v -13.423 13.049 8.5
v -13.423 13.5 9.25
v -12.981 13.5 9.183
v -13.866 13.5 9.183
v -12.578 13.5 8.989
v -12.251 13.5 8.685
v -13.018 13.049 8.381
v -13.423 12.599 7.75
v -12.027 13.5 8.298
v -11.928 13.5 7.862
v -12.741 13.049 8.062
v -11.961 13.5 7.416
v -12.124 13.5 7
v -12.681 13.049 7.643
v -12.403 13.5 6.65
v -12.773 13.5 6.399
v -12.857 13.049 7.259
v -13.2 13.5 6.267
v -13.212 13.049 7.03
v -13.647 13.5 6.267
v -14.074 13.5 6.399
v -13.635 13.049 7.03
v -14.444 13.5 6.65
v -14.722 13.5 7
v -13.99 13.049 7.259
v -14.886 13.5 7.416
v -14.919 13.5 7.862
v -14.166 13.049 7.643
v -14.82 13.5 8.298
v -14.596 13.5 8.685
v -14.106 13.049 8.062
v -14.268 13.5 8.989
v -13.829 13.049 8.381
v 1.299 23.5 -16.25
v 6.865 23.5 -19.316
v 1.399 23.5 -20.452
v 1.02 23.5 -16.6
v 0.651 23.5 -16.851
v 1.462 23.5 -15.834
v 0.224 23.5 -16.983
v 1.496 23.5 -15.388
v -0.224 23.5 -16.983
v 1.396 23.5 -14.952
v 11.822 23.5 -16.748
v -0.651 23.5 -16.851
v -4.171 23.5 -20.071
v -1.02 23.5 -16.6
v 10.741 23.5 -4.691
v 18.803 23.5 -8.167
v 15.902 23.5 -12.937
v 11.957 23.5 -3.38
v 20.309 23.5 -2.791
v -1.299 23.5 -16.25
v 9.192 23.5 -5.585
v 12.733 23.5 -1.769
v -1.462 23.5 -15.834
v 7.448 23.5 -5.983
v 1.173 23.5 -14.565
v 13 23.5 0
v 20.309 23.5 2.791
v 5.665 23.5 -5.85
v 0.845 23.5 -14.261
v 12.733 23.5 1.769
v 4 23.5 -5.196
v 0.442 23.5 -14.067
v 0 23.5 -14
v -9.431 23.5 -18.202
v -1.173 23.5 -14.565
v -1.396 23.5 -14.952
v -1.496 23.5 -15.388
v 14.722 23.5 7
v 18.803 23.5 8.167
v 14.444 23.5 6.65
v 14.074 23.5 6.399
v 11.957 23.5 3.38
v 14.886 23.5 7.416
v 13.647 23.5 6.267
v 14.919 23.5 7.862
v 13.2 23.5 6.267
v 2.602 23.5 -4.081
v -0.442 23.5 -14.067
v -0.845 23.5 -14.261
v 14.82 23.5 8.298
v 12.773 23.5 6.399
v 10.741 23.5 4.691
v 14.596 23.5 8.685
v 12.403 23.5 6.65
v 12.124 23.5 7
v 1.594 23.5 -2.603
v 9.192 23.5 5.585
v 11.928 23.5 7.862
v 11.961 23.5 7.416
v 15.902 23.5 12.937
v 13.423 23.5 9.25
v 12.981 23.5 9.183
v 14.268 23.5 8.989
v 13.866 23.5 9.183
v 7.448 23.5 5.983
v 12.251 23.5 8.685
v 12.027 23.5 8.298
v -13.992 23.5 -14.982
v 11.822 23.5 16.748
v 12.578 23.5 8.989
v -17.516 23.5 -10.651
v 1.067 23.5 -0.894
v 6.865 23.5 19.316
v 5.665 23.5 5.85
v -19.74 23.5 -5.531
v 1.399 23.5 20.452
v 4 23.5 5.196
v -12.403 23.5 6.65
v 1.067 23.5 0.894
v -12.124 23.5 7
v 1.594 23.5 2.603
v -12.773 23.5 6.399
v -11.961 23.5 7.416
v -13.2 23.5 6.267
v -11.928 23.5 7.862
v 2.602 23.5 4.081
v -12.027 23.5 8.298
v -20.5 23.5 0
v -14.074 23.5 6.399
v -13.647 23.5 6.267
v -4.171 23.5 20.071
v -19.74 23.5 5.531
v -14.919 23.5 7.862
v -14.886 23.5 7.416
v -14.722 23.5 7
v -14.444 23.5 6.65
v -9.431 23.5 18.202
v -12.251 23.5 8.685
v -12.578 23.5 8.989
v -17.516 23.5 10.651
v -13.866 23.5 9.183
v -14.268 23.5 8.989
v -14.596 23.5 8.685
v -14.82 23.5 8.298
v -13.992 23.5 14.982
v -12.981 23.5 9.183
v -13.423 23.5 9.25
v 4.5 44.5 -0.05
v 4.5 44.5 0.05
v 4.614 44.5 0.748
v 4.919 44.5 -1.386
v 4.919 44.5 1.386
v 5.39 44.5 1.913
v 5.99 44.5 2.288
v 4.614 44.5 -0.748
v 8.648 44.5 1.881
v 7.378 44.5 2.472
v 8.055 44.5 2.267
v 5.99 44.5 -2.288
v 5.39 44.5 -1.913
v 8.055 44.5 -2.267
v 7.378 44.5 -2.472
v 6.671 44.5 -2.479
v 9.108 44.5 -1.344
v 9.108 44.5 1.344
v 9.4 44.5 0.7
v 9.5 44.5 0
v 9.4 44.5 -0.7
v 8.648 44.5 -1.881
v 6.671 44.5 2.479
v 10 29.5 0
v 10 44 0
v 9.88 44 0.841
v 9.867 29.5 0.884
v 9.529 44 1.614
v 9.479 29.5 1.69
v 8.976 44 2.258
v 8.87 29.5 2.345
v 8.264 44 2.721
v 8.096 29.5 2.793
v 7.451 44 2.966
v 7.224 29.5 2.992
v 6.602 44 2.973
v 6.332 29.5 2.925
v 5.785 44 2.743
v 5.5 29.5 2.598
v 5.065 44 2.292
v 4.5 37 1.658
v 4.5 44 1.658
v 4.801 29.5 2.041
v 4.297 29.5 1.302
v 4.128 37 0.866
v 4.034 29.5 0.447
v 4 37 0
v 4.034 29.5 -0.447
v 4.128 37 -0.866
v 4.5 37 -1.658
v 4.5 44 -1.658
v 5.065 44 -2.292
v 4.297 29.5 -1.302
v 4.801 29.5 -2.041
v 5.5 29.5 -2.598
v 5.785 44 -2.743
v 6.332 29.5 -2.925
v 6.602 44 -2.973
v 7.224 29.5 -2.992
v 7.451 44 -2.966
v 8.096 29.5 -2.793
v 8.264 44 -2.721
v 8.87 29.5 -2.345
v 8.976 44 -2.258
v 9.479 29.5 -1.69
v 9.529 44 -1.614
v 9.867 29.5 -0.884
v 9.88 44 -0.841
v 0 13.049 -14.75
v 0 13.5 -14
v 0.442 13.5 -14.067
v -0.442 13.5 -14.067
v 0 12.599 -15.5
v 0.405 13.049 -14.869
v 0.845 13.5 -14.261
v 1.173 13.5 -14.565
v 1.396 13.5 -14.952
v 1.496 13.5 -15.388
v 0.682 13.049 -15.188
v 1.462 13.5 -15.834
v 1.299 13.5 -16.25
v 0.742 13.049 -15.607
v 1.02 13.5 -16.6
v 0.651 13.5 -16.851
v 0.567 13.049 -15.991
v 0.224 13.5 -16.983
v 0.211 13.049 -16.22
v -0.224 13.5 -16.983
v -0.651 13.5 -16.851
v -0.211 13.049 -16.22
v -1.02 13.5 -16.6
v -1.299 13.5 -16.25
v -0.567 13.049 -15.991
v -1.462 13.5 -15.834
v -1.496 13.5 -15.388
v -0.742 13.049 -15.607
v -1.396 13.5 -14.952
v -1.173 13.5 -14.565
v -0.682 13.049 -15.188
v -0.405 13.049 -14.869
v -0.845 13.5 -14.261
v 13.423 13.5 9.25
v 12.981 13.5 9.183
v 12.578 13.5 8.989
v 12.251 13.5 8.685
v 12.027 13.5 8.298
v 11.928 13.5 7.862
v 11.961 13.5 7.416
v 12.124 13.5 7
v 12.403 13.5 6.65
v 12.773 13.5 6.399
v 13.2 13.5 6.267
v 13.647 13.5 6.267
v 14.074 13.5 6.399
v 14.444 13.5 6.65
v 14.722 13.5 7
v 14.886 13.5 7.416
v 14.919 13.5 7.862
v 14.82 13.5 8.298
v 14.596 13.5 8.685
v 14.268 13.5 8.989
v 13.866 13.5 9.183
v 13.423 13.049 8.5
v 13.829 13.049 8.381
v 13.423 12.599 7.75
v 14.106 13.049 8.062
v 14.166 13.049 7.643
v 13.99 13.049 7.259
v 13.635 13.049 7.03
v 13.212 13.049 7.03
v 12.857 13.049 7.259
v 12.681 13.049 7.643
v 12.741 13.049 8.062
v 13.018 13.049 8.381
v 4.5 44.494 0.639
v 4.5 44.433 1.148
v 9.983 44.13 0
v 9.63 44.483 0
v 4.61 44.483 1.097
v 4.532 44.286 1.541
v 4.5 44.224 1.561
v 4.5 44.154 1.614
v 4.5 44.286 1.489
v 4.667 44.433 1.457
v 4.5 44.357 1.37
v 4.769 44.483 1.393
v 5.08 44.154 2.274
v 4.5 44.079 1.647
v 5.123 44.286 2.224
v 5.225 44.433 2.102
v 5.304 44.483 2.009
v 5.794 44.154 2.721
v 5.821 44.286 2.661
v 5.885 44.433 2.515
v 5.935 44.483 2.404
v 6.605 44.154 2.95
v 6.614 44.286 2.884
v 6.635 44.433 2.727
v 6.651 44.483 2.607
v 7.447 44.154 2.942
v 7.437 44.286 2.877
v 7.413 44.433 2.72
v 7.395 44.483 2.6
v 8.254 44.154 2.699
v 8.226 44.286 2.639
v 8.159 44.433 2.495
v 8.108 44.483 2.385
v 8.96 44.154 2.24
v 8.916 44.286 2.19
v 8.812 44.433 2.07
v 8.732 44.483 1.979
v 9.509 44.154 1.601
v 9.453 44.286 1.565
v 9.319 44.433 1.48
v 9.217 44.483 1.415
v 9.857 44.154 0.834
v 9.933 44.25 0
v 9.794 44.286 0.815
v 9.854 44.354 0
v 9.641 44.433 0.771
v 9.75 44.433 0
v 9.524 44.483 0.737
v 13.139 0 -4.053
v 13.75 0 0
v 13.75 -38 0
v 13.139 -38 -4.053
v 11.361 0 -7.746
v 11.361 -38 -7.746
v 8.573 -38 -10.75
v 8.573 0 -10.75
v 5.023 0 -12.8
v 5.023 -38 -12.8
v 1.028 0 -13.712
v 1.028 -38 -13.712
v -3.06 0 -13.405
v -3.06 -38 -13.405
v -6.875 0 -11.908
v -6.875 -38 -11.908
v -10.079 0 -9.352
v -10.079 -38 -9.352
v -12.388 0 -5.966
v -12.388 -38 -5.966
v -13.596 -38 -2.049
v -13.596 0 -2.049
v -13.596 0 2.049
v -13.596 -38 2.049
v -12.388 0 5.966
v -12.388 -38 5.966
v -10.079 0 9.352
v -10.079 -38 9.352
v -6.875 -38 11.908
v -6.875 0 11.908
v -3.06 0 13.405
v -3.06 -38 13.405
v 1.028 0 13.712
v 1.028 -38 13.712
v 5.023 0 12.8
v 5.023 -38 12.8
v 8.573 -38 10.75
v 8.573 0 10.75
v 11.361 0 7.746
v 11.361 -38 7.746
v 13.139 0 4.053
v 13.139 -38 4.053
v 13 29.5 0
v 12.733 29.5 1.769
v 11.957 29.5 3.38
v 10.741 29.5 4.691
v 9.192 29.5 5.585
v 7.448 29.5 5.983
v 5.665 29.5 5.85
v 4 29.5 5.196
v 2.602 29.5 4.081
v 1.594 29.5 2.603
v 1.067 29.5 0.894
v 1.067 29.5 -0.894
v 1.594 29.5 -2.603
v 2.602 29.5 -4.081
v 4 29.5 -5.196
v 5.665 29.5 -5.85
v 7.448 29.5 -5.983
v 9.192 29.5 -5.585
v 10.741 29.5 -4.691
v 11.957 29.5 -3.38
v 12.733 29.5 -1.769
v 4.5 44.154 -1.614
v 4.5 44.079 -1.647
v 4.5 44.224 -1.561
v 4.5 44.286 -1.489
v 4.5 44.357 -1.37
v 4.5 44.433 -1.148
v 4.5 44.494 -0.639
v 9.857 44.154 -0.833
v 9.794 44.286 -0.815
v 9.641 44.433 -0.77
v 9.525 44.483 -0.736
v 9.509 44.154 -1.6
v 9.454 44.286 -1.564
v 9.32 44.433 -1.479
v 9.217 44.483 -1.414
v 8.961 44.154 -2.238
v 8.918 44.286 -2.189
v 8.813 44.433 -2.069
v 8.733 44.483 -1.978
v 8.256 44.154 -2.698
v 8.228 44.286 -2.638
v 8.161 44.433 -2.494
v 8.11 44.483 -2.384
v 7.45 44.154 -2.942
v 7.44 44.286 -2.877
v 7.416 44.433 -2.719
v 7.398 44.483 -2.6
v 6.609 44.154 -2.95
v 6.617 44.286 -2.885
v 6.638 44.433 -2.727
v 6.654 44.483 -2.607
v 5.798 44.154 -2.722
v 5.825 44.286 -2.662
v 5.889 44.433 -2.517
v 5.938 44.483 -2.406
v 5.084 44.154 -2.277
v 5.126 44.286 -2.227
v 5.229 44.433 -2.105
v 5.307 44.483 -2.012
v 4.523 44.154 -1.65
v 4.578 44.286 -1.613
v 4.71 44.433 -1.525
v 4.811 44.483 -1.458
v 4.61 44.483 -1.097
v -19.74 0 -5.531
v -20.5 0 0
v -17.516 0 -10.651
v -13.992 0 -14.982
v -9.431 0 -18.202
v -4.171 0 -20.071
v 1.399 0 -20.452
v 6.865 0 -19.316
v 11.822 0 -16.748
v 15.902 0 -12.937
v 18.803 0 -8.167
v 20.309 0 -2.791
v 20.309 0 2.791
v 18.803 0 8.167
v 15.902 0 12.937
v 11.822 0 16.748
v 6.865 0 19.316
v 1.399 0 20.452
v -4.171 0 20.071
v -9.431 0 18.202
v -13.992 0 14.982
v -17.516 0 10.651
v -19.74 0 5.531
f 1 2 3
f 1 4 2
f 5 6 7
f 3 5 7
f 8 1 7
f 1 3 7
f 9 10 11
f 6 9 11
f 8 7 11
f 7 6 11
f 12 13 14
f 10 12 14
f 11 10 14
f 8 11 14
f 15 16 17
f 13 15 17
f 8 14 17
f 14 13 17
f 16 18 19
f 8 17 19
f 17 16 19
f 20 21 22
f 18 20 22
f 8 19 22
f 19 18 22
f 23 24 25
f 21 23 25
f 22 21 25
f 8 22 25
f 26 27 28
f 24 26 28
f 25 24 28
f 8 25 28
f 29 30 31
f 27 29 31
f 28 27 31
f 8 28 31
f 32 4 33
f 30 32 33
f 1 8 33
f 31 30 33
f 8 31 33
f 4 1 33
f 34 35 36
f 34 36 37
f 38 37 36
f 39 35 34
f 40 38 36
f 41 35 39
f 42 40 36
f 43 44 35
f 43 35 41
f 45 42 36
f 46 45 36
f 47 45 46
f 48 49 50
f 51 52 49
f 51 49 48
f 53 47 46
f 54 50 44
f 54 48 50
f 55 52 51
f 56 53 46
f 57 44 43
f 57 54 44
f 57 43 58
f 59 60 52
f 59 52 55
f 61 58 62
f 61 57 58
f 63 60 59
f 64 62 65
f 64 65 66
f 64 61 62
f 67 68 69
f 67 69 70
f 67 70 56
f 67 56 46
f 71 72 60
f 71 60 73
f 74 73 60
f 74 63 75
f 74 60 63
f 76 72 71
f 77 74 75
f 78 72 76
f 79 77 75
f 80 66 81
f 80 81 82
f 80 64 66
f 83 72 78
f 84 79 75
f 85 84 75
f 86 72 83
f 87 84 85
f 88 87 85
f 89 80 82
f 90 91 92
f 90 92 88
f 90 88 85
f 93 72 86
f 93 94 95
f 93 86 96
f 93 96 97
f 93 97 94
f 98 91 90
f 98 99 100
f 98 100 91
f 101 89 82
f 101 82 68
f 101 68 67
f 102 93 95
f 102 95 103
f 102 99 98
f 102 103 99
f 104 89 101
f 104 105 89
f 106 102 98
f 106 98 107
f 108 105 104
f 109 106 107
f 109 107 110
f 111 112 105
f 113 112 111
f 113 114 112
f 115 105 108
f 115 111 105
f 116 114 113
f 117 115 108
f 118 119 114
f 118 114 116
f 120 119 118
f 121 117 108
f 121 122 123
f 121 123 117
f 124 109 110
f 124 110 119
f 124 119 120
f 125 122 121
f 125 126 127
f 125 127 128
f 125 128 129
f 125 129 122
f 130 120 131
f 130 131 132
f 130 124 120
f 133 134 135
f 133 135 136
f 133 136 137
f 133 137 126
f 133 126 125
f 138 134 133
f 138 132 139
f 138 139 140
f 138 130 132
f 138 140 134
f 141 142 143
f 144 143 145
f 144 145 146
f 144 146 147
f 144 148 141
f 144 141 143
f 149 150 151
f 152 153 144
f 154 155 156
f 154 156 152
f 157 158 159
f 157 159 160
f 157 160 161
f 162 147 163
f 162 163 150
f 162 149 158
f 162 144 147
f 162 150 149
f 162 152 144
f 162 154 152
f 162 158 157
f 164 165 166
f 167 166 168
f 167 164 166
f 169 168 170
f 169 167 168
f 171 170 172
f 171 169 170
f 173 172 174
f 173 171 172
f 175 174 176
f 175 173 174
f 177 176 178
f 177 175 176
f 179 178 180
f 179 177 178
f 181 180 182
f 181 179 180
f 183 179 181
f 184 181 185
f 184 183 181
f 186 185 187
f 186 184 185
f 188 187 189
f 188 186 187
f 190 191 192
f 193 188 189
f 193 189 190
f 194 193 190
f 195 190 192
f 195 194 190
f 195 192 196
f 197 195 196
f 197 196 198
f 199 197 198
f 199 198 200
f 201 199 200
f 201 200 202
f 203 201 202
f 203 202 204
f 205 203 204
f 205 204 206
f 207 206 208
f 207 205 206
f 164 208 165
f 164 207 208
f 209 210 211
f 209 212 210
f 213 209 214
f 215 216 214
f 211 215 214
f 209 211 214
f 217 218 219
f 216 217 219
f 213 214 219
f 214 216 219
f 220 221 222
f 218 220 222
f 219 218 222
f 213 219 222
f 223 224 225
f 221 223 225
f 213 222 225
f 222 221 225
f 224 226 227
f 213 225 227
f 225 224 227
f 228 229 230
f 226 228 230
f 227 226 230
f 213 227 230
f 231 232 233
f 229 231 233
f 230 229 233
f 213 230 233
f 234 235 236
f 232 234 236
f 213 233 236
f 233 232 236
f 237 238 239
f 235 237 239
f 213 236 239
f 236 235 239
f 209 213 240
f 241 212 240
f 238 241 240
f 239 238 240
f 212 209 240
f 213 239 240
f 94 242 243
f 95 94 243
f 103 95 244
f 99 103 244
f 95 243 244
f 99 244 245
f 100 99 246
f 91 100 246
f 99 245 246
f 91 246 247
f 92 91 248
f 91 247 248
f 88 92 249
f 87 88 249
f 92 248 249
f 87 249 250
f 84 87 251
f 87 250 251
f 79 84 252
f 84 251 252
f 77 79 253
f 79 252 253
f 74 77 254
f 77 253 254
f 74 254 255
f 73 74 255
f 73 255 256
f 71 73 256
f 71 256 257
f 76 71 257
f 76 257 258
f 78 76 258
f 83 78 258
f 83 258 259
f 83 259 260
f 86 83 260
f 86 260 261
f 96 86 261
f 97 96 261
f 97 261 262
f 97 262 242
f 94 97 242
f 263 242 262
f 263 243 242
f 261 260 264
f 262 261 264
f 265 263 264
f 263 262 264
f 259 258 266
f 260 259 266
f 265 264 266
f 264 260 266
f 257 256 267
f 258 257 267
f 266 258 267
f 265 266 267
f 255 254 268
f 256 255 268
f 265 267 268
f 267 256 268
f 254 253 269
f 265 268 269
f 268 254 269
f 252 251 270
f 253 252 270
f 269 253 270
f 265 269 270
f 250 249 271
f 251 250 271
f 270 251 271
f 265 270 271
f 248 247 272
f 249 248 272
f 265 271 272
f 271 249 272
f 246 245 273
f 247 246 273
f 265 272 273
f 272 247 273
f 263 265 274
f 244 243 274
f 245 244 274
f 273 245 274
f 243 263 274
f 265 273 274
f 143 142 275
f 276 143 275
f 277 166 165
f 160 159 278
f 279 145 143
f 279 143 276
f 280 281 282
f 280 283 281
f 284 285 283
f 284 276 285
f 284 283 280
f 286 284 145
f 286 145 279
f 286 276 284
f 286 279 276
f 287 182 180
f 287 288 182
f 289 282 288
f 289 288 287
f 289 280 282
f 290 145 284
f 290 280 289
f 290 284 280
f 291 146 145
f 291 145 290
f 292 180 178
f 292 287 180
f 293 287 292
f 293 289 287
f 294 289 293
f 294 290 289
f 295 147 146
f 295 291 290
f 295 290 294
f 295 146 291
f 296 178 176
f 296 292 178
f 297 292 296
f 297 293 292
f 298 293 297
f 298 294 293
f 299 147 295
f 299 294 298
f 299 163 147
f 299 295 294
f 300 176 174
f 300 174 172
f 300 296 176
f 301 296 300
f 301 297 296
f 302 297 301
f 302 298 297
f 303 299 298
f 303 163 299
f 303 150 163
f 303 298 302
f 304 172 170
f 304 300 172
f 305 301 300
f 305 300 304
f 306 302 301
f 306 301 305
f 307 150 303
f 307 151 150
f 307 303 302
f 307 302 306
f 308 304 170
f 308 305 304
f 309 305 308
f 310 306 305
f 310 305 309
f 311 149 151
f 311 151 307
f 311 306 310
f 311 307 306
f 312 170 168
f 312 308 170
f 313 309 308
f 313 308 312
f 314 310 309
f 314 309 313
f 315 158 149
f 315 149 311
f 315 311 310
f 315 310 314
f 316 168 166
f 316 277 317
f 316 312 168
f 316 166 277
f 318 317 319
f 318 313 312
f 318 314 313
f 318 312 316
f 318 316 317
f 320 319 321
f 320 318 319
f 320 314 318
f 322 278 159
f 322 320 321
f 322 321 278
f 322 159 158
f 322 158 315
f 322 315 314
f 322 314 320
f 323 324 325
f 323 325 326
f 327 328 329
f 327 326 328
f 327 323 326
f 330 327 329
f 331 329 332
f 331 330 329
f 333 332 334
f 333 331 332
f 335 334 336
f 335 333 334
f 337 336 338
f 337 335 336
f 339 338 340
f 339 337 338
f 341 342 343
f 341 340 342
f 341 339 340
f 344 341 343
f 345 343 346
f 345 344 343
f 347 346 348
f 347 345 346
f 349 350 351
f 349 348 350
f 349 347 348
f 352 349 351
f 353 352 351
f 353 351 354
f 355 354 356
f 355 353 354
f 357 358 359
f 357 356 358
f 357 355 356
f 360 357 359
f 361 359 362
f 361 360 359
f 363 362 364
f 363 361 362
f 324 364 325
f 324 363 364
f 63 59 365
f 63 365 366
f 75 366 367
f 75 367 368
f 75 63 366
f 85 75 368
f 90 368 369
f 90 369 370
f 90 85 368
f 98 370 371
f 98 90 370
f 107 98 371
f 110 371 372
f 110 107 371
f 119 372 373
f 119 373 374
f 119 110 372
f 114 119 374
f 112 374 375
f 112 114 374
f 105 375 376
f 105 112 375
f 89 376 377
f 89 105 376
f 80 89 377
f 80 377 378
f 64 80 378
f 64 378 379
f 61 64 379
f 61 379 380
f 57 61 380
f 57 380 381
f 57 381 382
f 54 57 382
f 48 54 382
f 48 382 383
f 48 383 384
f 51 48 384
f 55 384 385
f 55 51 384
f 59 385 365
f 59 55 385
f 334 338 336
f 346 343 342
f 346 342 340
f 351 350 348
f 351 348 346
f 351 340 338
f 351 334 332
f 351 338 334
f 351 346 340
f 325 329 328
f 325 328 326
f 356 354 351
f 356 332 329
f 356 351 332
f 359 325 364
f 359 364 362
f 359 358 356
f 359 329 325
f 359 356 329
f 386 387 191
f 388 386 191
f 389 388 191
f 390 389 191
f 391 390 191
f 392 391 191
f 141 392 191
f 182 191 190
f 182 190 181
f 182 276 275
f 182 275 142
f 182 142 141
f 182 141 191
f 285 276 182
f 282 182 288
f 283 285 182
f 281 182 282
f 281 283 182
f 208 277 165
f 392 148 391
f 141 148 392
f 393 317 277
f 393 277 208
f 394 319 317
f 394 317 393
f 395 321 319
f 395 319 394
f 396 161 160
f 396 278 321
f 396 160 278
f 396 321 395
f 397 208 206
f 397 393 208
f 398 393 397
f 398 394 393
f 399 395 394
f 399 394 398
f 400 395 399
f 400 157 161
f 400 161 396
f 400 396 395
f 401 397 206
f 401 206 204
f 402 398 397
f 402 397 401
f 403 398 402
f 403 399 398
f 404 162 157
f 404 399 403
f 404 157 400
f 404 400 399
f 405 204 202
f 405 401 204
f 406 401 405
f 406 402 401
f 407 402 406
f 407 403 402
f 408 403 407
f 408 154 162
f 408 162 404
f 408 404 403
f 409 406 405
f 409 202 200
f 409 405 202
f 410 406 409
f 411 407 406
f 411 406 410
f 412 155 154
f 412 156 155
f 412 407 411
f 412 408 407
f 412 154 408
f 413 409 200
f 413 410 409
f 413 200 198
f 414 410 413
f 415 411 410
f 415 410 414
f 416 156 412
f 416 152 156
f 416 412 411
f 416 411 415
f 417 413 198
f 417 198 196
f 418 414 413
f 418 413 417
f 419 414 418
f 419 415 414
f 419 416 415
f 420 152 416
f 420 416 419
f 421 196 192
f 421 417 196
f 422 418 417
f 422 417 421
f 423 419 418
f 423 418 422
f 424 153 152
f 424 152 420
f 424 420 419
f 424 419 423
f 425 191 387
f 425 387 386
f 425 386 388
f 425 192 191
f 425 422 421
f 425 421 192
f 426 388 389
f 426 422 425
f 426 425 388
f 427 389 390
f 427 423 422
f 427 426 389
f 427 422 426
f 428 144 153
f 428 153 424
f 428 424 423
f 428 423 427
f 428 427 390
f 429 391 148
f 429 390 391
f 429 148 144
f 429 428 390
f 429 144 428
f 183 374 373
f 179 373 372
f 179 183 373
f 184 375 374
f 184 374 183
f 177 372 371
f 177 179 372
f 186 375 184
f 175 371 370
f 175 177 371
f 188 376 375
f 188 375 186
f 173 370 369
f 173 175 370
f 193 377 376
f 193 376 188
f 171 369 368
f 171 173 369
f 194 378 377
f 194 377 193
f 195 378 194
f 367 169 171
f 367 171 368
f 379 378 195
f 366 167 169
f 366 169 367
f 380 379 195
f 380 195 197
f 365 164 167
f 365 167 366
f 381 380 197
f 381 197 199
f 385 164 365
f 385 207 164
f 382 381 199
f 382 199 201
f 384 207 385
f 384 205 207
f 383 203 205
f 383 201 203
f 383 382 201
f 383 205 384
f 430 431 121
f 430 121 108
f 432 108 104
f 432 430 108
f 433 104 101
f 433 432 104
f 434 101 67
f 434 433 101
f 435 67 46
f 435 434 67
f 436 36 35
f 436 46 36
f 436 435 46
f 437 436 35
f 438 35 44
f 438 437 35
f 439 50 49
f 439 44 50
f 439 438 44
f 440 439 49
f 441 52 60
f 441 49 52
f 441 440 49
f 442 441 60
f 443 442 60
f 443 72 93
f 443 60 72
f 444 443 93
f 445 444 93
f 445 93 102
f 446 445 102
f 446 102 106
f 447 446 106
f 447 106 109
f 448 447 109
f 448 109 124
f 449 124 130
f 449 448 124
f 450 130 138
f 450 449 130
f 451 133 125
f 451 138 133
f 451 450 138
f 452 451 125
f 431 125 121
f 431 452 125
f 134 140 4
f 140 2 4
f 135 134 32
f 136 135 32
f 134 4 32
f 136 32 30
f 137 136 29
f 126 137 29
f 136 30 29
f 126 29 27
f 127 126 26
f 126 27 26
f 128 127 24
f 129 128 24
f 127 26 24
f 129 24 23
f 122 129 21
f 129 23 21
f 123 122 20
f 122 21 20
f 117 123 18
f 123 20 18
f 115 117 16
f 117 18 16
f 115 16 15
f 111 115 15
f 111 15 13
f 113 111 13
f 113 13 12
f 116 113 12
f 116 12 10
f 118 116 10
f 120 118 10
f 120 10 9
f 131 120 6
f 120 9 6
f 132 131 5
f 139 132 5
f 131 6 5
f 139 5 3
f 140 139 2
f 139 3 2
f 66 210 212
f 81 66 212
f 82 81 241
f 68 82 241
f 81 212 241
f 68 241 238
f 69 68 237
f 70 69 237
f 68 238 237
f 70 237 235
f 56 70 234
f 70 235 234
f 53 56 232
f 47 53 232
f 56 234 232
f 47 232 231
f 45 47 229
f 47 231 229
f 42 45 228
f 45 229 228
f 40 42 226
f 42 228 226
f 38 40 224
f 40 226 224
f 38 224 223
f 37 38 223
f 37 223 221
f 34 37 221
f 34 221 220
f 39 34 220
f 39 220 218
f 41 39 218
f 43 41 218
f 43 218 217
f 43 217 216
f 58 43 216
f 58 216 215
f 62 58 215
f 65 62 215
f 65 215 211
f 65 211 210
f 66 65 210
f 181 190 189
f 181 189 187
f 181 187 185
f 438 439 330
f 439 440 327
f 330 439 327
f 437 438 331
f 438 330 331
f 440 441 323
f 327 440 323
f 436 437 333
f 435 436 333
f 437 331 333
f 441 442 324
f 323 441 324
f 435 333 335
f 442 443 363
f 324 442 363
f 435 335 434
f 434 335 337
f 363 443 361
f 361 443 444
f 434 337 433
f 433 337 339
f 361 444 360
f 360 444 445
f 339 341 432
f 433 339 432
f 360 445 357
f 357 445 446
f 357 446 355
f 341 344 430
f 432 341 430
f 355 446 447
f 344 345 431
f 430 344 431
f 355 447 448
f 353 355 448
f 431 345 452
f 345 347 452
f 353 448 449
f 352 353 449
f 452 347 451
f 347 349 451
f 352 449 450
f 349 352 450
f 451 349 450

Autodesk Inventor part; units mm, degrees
ref_plane "YZ Plane" through (0, 0, 0) normal (1, 0, 0) x (0, 1, 0)
ref_plane "XZ Plane" through (0, 0, 0) normal (0, 1, 0) x (-1, 0, 0)
ref_plane "XY Plane" through (0, 0, 0) normal (0, 0, 1) x (1, 0, 0)
sketch "スケッチ1" plane through (0, 0, 0) normal (0, 1, 0) x (-1, 0, 0)
  circle A0 centre (0, 0) radius 20.5
  dimension "d0" = 41
extrude "押し出し1" add sketch "スケッチ1" along normal blind 23.5
sketch "スケッチ2" plane through (0, 23.5, 0) normal (0, 1, 0) x (1, 0, 0)
  line L0 (0, 0) -> (7, 0)
  circle A0 centre (7, 0) radius 6
  dimension "d3" = 7
  dimension "d4" = 12
extrude "押し出し2" add sketch "スケッチ2" along normal blind 6
sketch "スケッチ3" plane through (7, 29.5, 0) normal (0, 1, 0) x (1, 0, 0)
  circle A0 centre (0, 0) radius 3
  point P0 (-7, 0)
  dimension "d7" = 6
extrude "押し出し3" add sketch "スケッチ3" along normal blind 15
sketch "スケッチ6" plane through (0, 23.5, 0) normal (0, 1, 0) x (1, 0, 0)
  circle A0 centre (0, 0) radius 15.5
  line L0 (0, 0) -> (23.5113, 0) construction
  line L1 (0, 0) -> (25.2681, -14.5885)
  line L2 (0, 0) -> (29.1771, 0) construction
  line L3 (0, 0) -> (-23.275, -13.4378)
  line L4 (0, 0) -> (26.8756, 0) construction
  point P0 (0, 15.5)
  point P1 (-13.4234, -7.75)
  point P2 (13.4234, -7.75)
  dimension "d31" = 31
  dimension "d33" = 30
  dimension "d34" = 150
hole "穴3" at (0, 23.5, -15.5) at (-13.4234, 23.5, 7.75) at (13.4234, 23.5, 7.75) direction (0, -1, 0) diameter 3 depth 10 tip angle 118
sketch "スケッチ7" plane through (0, 0, 0) normal (0, -1, 0) x (1, 0, 0)
  circle A0 centre (0, 0) radius 13.75
  dimension "d42" = 27.5
extrude "押し出し4" add sketch "スケッチ7" along normal blind 38
sketch "スケッチ8" plane through (7, 44.5, 0) normal (0, 1, 0) x (1, 0, 0)
  line L0 (-2.5, 0) -> (-2.5, 1.6583)
  circle A0 centre (0, 0) radius 3 projected
  line L1 (-2.5, 0) -> (-2.5, -1.6583)
  arc A1 (-2.5, 1.6583) -> (-2.5, -1.6583) centre (0, 0) ccw
  point P0 (-7, 0)
extrude "押し出し5" cut sketch "スケッチ8" against normal blind 7.5 contours L1 A0 L0 picked at (-2.6056, -0.897)
fillet "フィレット2" radius 0.5 1 edges at (7.866, 44.5, 2.8723)
properties part number "tamiya"
